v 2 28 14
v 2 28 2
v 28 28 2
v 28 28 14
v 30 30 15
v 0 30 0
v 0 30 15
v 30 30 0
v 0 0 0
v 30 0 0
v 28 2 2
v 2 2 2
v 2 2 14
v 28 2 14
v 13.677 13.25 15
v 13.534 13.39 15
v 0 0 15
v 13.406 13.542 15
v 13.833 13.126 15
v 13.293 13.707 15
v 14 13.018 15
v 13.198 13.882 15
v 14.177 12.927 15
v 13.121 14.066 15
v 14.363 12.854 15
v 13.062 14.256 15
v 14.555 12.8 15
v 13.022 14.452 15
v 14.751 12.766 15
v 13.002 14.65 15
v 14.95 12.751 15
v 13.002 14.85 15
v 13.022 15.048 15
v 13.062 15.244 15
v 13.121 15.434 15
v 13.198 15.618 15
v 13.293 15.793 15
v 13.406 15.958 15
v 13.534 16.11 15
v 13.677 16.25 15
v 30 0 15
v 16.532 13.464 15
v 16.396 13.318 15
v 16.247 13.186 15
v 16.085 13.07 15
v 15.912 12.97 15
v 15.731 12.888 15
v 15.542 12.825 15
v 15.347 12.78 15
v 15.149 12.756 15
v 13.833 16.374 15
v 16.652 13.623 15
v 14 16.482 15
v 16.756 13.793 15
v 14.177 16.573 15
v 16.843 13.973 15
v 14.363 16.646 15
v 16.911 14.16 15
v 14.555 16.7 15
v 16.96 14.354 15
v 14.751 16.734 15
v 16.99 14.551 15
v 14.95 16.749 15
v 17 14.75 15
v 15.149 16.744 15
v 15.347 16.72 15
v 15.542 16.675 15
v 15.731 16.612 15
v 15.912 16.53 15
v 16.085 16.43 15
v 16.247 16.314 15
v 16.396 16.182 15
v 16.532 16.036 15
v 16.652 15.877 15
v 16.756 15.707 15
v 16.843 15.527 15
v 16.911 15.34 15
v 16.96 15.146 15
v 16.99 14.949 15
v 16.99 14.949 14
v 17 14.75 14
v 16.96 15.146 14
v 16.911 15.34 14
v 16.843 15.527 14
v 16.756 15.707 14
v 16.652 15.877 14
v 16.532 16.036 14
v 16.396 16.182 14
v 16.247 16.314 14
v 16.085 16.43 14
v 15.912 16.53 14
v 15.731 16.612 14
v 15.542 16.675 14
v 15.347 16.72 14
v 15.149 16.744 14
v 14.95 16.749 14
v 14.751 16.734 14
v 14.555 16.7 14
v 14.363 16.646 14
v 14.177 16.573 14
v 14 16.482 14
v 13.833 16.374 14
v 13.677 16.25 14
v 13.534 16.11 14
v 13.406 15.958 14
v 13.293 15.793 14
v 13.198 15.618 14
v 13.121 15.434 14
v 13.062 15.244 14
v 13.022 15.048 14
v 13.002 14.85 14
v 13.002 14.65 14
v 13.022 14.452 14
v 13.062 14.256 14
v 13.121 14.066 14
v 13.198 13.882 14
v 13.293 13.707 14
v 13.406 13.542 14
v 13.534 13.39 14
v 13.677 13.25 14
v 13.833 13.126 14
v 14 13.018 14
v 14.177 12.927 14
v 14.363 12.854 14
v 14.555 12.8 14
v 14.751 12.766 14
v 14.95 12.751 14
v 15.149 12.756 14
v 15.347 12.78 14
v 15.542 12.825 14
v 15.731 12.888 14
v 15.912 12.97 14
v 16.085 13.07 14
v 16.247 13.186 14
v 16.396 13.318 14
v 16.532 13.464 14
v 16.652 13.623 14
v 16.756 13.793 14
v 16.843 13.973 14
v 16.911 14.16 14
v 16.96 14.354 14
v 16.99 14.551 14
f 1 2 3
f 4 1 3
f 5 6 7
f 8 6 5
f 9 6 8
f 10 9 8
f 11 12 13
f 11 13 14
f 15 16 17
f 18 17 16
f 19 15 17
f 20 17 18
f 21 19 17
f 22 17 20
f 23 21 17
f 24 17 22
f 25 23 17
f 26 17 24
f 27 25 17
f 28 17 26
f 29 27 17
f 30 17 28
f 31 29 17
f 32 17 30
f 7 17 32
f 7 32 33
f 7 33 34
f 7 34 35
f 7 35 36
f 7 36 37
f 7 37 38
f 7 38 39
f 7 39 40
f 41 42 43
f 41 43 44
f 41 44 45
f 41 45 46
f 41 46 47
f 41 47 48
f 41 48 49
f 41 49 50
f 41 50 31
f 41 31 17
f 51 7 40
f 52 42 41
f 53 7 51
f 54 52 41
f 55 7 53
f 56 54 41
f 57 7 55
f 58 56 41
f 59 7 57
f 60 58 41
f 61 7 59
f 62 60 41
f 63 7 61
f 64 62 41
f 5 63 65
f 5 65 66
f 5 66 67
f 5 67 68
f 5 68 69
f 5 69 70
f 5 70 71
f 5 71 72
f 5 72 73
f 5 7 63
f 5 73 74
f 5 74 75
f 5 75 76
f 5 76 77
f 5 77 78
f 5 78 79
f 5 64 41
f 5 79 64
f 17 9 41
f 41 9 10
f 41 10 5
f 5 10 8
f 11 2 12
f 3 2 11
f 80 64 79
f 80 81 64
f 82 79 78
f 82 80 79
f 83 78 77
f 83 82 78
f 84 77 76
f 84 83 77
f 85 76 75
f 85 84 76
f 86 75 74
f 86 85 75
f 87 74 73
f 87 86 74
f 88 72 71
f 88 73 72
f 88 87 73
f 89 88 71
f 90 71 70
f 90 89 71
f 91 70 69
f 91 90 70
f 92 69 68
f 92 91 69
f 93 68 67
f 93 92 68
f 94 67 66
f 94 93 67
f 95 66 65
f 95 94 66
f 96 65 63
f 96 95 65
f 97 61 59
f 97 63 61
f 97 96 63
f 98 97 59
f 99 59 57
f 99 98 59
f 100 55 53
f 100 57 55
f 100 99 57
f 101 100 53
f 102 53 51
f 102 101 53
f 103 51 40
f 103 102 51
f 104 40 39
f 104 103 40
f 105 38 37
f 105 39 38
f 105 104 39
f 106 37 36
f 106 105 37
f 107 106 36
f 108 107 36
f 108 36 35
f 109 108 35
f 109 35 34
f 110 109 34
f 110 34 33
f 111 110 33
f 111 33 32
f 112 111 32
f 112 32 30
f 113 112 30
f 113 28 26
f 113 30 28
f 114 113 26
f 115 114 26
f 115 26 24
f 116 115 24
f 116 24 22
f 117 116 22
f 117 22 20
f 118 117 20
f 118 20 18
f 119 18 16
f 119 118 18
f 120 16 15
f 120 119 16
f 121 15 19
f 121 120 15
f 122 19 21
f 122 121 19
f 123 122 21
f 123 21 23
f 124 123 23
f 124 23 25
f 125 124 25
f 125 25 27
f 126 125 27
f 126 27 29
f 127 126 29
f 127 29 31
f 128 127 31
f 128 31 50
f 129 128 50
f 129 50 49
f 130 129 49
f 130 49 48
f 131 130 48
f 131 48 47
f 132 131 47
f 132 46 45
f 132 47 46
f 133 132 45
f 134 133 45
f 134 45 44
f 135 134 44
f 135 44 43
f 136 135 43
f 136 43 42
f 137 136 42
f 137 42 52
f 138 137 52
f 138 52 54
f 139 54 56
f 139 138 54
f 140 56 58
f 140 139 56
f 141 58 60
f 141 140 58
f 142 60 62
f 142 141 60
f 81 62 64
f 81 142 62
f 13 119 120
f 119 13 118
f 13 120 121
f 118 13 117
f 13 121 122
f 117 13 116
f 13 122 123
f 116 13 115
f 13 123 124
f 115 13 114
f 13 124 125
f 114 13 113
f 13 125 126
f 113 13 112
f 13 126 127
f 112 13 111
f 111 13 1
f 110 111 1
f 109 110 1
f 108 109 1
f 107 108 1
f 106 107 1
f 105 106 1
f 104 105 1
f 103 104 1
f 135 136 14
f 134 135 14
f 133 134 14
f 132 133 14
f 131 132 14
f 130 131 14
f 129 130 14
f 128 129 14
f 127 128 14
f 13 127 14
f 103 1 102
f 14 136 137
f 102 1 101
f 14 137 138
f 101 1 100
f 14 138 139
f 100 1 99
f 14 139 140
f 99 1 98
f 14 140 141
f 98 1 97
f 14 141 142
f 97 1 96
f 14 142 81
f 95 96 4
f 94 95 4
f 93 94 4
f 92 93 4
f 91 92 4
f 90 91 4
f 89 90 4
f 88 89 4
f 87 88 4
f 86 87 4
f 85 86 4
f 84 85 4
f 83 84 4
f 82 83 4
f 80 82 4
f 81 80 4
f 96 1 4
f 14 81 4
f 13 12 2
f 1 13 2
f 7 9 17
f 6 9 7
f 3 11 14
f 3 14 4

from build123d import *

# Parameters (mm, degrees)
CYLINDER001_R     = 2
CYLINDER001_DEPTH = 3
BOX002_W          = 26
BOX002_H          = 26
BOX002_DEPTH      = 12
BOX001_W          = 30
BOX001_H          = 30
BOX001_DEPTH      = 15


with BuildPart() as cylinder_cut:
    # Cylinder001 → Cylinder001 (new body)
    with BuildSketch(Plane(origin=(15, 14.75, 13), x_dir=(1, 0, 0), z_dir=(0, 0, 1))):
        Circle(CYLINDER001_R)
    extrude(amount=CYLINDER001_DEPTH)


with BuildPart() as box_in:
    # Box002 → Box002 (new body)
    with BuildSketch(Plane(origin=(2, 2, 2), x_dir=(1, 0, 0), z_dir=(0, 0, 1))):
        with Locations((13, 13)):
            Rectangle(BOX002_W, BOX002_H)
    extrude(amount=BOX002_DEPTH)


with BuildPart() as cut001:
    # Box001 → Box001 (new body)
    with BuildSketch(Plane.XY):
        with Locations((15, 15)):
            Rectangle(BOX001_W, BOX001_H)
    extrude(amount=BOX001_DEPTH)

    # Cut: cut Box_in
    add(box_in.part, mode=Mode.SUBTRACT)

    # Cut001: cut Cylinder_cut
    add(cylinder_cut.part, mode=Mode.SUBTRACT)


solid = cut001.part
